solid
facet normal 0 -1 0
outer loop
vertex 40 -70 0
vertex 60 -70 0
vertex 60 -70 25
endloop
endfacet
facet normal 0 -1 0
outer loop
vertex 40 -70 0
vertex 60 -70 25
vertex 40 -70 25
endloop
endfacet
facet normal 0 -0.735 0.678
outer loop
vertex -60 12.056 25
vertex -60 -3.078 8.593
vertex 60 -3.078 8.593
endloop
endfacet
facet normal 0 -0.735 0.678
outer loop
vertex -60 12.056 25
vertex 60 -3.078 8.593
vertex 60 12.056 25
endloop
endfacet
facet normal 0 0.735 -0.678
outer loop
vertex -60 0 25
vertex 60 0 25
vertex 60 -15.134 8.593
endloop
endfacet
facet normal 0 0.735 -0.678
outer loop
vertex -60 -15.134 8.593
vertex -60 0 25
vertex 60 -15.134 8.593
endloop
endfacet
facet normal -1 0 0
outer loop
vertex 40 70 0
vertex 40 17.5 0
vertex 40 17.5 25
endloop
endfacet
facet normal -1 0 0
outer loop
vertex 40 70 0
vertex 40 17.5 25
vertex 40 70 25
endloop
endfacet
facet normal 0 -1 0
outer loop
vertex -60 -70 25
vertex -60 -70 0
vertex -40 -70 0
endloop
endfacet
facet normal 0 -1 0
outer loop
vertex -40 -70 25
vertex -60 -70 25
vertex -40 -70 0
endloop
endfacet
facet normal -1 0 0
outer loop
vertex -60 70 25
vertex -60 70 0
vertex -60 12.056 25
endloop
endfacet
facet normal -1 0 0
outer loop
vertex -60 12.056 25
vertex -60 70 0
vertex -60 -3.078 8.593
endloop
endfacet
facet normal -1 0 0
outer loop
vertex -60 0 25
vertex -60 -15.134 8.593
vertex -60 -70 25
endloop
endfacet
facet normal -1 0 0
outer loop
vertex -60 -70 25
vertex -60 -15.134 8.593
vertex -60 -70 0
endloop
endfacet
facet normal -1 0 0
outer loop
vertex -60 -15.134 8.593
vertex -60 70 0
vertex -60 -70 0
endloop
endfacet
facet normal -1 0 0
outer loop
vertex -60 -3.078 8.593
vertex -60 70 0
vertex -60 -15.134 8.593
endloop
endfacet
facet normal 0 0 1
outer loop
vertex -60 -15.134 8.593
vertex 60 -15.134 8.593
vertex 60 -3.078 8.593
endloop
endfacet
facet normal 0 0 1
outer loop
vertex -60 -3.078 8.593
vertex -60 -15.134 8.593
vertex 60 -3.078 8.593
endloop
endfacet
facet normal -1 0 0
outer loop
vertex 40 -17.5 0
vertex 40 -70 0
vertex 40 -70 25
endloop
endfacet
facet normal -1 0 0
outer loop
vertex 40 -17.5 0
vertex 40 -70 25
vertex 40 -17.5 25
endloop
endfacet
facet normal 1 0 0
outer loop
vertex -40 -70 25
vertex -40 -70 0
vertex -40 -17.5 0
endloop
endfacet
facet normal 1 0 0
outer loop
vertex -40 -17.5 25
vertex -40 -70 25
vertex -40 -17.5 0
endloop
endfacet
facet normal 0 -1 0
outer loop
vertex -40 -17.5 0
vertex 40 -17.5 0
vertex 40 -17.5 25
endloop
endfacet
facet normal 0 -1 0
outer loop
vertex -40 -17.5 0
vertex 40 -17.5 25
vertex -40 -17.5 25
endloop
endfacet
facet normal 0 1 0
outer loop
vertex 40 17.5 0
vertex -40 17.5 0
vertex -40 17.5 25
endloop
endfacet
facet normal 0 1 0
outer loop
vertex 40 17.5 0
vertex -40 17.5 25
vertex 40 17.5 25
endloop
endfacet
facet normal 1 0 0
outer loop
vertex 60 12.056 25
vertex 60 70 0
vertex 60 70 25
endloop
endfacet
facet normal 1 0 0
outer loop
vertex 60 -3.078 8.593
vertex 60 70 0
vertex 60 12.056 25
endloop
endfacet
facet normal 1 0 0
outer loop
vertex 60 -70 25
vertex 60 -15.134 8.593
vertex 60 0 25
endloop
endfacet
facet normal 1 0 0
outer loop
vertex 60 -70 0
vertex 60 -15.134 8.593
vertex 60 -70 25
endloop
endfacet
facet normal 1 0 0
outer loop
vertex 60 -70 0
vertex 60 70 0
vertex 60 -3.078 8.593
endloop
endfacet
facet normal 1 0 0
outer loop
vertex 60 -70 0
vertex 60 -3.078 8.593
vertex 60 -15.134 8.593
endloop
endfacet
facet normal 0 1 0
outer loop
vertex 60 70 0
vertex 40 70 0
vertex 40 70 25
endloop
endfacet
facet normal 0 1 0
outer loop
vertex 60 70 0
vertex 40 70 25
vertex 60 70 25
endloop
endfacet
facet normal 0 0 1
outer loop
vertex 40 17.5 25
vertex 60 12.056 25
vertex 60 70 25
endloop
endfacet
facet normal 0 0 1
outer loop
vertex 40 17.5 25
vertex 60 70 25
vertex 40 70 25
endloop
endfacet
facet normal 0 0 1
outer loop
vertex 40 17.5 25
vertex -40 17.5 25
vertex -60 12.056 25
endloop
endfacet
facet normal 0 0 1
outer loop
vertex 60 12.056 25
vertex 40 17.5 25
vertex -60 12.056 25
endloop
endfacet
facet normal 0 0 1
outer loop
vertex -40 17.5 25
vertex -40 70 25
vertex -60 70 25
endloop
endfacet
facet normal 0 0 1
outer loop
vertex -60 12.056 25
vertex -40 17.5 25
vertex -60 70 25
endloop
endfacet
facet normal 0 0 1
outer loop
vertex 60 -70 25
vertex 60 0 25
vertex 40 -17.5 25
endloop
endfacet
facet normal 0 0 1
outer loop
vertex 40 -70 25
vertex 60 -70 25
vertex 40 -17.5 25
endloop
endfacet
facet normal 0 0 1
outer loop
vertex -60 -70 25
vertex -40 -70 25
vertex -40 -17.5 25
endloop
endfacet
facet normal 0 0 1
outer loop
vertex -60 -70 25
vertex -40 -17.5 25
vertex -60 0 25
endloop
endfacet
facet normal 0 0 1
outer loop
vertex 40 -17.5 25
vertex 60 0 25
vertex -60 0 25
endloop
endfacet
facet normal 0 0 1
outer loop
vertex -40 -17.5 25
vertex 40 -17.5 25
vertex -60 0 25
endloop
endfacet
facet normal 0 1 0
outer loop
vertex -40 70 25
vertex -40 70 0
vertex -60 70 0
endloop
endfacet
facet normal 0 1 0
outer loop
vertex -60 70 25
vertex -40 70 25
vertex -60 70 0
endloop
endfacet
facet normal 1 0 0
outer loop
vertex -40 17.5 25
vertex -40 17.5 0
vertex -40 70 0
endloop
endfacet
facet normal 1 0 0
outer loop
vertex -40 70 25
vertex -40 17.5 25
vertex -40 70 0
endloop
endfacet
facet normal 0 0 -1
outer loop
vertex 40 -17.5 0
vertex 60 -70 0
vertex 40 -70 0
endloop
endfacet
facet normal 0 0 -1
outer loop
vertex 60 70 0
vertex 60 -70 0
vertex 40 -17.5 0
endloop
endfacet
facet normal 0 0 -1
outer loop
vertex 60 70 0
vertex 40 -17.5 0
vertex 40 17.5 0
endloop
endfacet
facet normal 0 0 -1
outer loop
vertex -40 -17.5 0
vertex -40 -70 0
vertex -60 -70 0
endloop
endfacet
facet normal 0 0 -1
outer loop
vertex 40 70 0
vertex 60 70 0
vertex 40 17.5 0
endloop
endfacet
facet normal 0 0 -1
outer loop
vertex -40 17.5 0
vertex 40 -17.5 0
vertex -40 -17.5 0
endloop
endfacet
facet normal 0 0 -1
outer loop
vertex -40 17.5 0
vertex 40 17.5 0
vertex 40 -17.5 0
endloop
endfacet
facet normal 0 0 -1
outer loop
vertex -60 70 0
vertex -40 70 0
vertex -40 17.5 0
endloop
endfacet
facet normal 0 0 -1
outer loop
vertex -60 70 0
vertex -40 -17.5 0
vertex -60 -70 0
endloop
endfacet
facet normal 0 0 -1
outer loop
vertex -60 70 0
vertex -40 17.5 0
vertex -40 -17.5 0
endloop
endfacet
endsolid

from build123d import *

# Parameters (mm, degrees)
F1_DEPTH = 25
F4_DEPTH = 166.4


with BuildPart() as f1:
    # F0 (on Top) → F1 (new body)
    with BuildSketch(Plane.XY):
        Polygon((-40, 17.5), (-40, 70), (-60, 70), (-60, -70), (-40, -70), (-40, -17.5), (0, -17.5), (0, 4.859984), (0, 17.5), align=None)
    extrude(amount=F1_DEPTH)

    # F2: F1 across plane


with BuildPart() as f1_1:
    add(f1.part)
    add(f1.part.mirror(Plane.YZ))

    # F3 (on face) → F4 (cut)
    with BuildSketch(Plane.YZ.offset(60)):
        Polygon((12.05619, 25), (0, 25), (-15.134365, 8.593241), (-3.078176, 8.593241), align=None)
    extrude(amount=-F4_DEPTH, mode=Mode.SUBTRACT)


solid = f1_1.part
